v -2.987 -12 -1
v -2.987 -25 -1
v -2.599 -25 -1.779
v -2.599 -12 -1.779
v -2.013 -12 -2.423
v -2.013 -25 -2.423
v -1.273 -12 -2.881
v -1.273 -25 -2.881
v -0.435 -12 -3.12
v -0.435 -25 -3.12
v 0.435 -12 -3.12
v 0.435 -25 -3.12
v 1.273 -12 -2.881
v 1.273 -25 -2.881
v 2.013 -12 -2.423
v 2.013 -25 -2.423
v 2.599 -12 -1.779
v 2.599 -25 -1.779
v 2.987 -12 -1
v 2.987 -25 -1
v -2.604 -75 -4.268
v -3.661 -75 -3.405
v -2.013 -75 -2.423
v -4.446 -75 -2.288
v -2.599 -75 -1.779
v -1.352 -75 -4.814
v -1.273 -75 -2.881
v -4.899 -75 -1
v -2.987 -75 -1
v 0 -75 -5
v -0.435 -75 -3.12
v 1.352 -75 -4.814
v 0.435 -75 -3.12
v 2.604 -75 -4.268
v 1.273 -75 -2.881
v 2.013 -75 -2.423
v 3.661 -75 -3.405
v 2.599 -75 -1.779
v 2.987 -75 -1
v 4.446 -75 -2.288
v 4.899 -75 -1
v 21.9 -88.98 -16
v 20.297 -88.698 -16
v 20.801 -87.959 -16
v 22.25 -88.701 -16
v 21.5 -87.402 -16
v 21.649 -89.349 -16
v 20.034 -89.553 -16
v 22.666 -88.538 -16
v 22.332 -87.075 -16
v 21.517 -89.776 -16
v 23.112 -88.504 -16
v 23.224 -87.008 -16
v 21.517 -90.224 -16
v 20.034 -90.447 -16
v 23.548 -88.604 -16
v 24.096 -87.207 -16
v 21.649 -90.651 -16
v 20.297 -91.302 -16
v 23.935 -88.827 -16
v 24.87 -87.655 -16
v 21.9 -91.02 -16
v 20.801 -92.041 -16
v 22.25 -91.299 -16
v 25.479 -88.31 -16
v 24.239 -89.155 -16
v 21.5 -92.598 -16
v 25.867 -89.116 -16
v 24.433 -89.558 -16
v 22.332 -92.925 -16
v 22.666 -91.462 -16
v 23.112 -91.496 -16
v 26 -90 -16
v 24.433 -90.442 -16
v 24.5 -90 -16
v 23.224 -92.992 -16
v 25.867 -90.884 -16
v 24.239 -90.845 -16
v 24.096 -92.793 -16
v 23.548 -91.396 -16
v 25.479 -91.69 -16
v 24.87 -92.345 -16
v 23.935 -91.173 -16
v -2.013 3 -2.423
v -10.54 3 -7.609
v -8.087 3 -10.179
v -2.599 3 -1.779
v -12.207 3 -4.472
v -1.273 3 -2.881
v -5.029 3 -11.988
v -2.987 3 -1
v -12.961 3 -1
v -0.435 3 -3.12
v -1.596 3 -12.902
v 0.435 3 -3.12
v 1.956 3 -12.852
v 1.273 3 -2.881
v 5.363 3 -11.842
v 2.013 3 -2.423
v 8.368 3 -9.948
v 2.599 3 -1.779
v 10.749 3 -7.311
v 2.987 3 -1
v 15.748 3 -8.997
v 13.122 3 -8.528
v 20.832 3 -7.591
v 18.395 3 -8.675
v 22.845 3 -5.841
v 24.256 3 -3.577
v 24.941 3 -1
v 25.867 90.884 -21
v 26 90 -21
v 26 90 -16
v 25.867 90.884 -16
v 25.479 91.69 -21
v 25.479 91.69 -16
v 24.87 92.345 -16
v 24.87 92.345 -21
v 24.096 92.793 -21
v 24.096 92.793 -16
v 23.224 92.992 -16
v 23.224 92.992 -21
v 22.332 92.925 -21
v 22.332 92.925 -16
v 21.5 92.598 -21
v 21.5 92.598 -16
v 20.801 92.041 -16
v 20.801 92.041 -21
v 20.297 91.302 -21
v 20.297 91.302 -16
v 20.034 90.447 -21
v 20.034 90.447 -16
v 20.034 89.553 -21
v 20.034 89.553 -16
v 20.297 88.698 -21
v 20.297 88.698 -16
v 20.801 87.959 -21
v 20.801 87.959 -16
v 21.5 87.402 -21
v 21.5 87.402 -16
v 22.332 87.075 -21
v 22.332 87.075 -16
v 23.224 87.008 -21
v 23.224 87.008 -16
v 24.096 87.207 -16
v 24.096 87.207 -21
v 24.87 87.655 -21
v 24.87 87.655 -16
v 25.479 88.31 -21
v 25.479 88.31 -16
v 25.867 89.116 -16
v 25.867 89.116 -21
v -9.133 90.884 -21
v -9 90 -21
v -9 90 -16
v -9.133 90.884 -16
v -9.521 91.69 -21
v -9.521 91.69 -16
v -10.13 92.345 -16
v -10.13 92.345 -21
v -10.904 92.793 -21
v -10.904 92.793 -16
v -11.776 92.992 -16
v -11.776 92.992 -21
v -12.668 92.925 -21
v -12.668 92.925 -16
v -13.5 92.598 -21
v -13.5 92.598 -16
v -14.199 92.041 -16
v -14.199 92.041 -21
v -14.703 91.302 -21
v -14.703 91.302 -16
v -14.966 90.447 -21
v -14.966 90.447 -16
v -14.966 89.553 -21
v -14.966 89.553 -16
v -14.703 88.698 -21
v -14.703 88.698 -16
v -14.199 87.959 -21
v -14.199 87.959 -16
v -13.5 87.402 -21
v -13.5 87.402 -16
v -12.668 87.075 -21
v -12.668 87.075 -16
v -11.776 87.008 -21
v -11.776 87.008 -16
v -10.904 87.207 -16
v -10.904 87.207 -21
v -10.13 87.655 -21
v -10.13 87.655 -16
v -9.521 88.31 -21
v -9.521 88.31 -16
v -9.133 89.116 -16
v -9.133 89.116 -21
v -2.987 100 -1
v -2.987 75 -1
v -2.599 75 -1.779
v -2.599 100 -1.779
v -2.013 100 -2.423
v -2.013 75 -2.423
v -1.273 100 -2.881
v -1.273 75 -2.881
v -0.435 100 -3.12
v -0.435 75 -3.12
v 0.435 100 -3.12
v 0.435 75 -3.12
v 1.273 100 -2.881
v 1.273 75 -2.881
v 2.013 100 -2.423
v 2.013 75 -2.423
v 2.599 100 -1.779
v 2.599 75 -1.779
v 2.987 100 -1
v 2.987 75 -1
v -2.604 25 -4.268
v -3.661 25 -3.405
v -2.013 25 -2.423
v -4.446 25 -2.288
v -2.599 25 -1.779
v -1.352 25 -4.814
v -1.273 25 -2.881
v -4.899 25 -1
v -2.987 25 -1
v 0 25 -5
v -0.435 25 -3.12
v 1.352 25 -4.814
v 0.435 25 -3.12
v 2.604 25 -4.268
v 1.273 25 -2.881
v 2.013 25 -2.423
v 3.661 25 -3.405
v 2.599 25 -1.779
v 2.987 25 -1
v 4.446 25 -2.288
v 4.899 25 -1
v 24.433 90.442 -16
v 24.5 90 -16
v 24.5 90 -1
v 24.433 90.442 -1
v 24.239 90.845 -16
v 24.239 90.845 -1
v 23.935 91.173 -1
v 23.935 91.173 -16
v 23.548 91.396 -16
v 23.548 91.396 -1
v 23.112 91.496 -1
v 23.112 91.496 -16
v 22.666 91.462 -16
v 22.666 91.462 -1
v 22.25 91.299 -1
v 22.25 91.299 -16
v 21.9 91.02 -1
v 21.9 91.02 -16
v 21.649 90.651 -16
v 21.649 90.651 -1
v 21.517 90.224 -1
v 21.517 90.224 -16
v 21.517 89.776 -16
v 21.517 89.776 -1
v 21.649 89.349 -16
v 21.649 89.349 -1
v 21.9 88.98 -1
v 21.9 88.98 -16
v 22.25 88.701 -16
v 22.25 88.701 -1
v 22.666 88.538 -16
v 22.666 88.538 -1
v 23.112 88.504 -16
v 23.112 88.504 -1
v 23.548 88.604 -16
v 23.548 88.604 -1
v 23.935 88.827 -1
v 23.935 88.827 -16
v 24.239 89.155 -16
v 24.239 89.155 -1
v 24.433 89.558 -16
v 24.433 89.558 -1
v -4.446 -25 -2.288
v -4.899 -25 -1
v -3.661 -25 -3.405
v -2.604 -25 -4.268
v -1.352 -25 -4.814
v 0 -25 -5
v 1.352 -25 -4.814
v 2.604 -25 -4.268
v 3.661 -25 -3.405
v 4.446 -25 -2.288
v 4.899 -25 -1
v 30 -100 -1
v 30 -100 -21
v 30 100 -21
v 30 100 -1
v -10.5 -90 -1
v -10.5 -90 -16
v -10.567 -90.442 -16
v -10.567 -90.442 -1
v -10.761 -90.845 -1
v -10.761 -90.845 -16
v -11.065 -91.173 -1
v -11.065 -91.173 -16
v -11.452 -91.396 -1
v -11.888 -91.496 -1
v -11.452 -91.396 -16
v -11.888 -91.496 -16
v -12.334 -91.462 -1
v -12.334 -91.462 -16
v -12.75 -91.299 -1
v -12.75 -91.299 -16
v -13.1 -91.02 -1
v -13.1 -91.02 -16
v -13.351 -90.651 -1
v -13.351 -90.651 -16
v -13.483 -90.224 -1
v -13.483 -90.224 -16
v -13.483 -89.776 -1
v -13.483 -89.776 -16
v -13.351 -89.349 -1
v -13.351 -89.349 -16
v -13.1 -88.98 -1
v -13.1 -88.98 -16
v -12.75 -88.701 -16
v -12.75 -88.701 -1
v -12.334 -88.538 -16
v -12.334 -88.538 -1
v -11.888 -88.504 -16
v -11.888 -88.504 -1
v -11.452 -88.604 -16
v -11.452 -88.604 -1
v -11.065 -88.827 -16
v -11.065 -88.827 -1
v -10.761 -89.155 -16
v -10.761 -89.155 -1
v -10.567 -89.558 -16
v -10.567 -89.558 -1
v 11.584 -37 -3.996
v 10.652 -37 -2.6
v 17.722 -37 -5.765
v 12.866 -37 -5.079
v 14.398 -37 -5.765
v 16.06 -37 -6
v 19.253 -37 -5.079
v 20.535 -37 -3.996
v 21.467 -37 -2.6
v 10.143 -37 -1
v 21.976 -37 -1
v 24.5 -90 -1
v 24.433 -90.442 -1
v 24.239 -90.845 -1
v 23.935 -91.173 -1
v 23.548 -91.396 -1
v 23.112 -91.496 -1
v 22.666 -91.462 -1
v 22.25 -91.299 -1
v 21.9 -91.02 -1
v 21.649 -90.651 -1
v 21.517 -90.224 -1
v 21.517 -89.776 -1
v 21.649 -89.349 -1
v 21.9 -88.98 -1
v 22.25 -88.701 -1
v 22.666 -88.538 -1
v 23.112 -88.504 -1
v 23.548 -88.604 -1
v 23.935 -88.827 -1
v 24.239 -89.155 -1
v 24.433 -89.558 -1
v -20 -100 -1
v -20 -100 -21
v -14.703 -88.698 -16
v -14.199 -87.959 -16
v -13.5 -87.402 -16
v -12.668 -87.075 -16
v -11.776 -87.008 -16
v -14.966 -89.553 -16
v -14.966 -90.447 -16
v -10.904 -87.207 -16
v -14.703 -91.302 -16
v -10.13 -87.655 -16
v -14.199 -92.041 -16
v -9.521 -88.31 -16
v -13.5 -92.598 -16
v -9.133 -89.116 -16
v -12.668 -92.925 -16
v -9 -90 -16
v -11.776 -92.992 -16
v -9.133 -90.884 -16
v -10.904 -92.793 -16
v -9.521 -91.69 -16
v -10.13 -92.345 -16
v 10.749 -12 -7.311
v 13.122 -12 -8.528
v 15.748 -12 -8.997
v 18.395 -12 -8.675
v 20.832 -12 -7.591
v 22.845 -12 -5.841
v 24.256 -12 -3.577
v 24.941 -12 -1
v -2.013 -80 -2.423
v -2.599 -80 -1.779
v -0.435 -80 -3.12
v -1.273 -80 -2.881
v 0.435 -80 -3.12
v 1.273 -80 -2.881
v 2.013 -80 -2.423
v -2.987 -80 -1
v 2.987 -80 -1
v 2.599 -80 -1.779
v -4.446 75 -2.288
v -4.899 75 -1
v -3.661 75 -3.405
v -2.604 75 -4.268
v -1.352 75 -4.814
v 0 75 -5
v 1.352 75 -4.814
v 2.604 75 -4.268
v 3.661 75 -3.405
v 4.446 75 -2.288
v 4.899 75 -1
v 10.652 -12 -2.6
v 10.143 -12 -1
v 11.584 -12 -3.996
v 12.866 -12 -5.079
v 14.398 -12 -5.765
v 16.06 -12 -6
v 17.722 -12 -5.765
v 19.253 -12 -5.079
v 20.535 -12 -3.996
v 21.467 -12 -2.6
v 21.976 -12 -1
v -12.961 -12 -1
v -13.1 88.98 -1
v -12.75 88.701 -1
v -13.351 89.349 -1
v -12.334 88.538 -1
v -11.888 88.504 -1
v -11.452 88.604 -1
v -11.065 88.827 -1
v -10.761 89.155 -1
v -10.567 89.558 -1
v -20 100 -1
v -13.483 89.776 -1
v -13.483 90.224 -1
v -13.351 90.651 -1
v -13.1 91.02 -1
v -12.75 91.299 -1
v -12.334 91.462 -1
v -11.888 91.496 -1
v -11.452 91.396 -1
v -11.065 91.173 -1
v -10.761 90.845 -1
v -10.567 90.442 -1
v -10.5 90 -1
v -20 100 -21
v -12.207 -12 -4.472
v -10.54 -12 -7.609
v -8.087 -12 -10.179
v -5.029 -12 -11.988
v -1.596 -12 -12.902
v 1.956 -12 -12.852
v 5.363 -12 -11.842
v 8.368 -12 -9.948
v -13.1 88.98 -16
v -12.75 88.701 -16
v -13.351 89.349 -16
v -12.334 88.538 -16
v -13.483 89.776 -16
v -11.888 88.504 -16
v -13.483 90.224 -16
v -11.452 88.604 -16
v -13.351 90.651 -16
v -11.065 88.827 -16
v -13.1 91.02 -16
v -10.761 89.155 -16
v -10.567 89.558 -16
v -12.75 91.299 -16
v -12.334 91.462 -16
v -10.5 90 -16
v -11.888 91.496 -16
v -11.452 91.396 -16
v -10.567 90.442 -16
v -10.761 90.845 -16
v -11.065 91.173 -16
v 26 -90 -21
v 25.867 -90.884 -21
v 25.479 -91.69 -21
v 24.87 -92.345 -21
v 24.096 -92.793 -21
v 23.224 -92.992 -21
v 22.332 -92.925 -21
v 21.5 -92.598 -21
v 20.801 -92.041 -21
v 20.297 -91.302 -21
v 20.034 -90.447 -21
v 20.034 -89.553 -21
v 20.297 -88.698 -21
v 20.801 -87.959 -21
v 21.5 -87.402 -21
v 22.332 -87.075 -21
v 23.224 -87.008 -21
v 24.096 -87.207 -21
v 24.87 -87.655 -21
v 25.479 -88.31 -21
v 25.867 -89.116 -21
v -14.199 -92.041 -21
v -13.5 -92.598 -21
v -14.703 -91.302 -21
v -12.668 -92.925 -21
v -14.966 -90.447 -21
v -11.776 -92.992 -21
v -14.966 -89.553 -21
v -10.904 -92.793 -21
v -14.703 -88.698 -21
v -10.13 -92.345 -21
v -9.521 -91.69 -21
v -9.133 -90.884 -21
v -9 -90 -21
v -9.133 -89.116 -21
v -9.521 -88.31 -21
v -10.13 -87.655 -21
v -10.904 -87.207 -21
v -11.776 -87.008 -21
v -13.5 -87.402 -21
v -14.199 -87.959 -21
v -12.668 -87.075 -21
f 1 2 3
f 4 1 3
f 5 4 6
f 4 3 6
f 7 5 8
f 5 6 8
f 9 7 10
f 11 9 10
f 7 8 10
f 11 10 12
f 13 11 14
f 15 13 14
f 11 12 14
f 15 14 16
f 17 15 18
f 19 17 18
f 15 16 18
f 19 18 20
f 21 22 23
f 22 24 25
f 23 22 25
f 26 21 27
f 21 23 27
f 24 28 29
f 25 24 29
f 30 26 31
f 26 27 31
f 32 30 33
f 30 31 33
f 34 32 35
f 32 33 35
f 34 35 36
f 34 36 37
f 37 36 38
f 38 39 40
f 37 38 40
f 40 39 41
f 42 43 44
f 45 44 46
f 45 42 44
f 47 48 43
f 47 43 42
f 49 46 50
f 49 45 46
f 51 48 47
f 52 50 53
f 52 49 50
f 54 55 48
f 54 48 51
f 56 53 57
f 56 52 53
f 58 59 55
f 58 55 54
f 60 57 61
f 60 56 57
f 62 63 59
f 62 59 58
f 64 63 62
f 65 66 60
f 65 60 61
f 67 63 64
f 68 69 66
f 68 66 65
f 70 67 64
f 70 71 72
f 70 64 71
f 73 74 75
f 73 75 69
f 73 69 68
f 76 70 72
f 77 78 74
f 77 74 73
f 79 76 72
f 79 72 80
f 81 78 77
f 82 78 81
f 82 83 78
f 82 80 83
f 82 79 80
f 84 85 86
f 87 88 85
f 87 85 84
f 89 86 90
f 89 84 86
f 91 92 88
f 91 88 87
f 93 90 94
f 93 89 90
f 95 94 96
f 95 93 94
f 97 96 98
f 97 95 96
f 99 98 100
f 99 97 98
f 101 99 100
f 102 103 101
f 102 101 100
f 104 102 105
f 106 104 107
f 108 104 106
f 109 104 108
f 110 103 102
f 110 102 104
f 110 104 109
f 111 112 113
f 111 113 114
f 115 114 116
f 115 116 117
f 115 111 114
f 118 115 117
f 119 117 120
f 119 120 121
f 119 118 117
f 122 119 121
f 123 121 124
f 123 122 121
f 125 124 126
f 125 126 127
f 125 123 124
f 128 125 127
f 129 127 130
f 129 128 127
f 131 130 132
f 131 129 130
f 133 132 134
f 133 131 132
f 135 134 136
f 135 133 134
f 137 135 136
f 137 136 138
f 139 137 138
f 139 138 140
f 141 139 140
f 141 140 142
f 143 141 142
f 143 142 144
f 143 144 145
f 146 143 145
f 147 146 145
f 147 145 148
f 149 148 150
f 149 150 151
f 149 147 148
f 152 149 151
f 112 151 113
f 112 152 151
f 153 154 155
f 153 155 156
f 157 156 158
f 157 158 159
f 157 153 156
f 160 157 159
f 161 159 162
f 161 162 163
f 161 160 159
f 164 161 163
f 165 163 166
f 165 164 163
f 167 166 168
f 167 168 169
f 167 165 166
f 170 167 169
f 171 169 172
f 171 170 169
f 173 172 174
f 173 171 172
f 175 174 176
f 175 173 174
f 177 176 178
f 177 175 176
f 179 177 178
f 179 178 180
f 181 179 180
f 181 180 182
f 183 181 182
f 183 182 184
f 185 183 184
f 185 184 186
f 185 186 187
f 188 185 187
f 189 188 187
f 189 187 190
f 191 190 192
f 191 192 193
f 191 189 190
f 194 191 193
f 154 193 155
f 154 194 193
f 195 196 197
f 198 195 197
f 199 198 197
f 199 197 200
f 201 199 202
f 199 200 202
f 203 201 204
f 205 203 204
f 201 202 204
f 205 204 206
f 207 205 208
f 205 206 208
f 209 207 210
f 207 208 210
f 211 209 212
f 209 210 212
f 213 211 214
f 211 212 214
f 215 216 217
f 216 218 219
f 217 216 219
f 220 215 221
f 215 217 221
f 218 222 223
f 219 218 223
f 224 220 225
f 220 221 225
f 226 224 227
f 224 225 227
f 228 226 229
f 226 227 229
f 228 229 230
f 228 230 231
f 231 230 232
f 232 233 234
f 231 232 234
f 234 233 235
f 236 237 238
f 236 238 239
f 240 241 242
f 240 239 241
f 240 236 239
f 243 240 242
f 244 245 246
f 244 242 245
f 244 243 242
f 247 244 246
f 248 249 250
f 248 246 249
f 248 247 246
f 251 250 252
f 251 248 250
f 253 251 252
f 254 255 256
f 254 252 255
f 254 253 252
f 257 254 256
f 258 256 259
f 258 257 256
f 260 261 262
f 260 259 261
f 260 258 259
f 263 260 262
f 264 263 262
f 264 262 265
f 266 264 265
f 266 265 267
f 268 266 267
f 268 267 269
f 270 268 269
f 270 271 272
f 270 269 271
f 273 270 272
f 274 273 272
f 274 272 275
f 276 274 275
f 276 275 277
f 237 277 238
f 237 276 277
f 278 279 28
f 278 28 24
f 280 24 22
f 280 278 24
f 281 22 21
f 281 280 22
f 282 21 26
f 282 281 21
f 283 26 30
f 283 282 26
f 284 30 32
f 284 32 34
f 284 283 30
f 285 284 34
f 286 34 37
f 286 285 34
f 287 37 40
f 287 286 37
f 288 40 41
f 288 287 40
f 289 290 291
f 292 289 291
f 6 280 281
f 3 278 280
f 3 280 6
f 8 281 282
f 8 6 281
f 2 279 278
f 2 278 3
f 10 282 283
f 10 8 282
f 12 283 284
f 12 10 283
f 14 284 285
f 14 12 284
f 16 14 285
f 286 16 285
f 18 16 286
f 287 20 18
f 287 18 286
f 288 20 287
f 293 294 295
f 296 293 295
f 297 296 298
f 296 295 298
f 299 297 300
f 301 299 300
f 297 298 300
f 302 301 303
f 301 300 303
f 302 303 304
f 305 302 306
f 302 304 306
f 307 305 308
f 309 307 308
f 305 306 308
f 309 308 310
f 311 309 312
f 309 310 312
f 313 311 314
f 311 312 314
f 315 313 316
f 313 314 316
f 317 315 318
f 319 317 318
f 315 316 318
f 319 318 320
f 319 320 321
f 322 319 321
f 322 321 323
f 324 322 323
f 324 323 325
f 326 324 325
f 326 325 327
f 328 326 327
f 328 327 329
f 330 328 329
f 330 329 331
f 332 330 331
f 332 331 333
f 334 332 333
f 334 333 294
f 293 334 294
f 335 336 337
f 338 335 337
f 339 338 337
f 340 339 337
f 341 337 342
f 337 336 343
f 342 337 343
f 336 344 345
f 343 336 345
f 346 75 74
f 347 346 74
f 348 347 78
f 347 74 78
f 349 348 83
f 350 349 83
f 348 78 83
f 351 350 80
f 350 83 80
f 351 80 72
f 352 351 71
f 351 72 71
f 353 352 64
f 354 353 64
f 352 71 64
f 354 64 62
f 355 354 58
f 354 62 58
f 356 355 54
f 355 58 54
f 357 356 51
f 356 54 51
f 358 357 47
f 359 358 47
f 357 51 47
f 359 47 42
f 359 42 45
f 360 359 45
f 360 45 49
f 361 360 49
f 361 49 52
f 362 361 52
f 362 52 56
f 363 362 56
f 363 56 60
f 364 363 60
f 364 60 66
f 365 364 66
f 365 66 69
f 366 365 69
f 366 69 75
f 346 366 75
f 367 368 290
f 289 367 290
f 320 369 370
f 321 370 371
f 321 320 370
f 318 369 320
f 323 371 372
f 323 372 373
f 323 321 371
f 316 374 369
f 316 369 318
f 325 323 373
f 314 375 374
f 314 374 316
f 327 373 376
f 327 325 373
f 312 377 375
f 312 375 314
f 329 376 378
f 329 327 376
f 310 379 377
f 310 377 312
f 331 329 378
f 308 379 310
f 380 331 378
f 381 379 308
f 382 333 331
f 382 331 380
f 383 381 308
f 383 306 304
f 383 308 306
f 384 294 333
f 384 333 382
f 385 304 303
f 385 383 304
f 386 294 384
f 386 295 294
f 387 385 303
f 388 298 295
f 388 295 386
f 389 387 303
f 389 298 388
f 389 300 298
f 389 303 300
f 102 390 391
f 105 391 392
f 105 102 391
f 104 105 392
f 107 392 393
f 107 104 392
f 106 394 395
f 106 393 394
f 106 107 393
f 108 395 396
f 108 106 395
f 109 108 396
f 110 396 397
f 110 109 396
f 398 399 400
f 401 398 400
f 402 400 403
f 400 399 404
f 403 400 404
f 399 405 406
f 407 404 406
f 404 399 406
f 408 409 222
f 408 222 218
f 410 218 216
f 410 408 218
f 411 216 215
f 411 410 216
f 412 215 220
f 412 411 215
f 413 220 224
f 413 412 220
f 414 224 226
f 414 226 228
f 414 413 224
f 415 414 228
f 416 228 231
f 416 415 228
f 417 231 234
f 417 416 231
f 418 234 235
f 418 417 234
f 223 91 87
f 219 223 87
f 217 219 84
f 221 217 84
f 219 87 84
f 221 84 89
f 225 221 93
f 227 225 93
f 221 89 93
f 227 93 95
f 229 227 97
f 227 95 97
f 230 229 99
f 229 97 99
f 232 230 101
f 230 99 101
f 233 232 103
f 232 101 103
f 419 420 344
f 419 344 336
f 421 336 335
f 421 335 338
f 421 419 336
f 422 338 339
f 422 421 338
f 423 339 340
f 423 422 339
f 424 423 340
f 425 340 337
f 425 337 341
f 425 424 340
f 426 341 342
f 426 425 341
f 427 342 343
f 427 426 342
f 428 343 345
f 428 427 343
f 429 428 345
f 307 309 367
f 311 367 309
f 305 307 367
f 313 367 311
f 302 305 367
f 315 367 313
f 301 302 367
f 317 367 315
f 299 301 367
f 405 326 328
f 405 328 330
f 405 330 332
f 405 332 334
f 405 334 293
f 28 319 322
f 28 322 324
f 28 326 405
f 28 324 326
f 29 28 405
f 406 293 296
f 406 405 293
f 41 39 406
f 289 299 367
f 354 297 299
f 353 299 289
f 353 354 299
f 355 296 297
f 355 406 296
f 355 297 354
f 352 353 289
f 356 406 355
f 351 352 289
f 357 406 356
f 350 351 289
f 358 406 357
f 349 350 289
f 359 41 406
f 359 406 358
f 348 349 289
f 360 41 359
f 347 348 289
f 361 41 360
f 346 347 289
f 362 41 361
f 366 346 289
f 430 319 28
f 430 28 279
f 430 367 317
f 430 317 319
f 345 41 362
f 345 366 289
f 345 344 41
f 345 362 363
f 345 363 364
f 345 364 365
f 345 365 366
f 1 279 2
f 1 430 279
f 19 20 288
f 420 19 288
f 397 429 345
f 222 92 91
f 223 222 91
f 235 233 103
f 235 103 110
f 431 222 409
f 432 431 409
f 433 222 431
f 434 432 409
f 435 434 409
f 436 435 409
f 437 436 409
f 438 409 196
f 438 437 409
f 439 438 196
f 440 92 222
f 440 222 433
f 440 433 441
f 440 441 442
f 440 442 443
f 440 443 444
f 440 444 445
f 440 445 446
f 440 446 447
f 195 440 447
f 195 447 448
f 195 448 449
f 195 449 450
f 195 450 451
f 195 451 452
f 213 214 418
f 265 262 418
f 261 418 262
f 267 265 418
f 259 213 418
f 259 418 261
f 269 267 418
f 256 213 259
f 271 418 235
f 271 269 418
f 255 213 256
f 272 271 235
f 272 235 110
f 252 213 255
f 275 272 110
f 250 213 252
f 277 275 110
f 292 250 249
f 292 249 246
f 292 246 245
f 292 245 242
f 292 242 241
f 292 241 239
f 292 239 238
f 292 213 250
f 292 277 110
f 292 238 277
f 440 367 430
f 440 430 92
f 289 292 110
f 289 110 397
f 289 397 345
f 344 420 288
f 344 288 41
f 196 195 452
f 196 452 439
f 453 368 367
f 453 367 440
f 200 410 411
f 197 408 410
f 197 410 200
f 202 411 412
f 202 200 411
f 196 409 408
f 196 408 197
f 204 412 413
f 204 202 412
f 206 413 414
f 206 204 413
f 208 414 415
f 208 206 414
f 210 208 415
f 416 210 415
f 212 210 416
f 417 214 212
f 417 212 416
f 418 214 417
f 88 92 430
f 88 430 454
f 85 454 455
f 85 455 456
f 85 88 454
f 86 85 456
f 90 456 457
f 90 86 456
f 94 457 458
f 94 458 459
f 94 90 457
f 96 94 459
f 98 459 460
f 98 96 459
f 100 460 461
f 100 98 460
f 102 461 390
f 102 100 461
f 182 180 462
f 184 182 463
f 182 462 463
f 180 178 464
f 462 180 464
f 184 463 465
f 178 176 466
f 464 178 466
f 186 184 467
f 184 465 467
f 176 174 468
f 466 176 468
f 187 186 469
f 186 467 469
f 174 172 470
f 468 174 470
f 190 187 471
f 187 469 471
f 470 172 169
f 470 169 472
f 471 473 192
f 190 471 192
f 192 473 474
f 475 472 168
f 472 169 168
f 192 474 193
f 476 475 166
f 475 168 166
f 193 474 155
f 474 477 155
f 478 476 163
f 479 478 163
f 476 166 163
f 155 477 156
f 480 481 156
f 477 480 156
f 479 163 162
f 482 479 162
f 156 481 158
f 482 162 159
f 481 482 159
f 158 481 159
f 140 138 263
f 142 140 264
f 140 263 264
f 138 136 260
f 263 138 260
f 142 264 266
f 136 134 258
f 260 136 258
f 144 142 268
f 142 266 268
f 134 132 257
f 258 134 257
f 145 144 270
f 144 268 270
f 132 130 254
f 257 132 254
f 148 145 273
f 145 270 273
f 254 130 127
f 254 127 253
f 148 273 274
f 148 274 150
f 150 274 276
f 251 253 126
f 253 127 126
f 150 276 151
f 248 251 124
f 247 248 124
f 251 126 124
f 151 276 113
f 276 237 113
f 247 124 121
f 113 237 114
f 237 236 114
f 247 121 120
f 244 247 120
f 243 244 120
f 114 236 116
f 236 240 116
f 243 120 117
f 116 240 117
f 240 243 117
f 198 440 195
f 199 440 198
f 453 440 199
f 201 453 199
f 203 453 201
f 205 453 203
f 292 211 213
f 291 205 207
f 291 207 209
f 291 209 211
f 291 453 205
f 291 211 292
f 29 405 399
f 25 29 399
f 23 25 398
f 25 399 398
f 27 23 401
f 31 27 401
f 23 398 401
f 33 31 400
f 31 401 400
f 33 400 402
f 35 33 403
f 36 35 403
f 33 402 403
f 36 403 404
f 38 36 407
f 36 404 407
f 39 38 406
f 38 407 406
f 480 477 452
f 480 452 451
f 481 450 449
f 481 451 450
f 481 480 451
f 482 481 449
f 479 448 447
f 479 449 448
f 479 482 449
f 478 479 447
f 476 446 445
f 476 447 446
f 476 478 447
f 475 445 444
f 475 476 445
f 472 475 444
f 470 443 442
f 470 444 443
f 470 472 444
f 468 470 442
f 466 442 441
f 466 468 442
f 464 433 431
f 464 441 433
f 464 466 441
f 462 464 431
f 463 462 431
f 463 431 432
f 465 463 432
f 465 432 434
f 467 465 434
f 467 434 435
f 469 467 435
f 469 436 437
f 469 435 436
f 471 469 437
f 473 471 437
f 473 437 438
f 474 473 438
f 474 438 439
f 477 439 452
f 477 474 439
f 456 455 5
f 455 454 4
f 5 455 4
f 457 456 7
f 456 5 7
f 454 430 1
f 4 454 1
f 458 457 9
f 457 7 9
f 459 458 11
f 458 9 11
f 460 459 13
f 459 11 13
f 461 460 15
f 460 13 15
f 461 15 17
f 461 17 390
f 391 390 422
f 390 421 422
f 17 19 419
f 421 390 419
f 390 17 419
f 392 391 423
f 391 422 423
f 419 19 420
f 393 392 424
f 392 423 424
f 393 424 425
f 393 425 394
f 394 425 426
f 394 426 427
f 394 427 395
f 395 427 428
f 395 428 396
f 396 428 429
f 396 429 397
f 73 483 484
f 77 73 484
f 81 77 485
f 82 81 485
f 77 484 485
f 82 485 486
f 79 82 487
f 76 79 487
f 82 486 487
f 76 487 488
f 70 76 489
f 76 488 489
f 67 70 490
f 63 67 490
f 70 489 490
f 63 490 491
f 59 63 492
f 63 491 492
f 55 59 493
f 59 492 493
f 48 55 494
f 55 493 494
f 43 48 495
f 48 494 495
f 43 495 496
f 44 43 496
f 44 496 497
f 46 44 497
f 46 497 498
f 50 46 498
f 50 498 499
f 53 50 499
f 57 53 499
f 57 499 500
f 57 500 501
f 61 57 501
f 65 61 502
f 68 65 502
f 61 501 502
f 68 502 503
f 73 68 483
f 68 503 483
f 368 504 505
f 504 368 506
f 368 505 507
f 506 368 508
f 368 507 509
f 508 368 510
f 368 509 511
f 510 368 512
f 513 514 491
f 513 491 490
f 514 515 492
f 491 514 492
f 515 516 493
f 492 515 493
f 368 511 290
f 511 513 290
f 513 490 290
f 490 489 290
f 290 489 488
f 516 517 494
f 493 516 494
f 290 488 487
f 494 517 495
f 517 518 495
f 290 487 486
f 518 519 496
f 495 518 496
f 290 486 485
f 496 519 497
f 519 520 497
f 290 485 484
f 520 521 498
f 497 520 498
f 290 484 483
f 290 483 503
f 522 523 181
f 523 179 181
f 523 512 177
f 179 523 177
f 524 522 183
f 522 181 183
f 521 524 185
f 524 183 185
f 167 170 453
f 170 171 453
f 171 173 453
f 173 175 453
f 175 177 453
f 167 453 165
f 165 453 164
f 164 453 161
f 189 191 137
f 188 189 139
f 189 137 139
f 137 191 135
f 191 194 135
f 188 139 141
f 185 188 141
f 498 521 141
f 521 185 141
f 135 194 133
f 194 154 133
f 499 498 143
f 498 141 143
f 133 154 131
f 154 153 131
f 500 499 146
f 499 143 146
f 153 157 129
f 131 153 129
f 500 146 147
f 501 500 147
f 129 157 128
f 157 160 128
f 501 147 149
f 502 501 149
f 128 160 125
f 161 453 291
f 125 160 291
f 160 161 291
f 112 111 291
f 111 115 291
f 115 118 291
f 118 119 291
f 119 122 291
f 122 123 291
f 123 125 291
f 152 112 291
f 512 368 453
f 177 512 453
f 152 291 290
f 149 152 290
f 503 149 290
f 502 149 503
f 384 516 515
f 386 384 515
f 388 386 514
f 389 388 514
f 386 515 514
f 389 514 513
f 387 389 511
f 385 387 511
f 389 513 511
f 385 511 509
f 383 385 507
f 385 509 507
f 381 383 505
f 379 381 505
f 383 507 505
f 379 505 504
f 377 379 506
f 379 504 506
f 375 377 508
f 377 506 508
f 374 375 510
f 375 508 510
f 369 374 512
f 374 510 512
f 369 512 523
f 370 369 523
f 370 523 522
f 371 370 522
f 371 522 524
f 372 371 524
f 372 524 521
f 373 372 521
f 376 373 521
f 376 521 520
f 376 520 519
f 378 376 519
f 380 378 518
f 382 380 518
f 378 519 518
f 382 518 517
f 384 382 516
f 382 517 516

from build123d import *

# Parameters (mm, degrees)
SKETCH006_R     = 3.15
PAD002_DEPTH    = 190
SKETCH011_R     = 5
PAD007_DEPTH    = 50
SKETCH010_R     = 5
PAD006_DEPTH    = 50
SKETCH008_R     = 13
PAD004_DEPTH    = 15
SKETCH009_R     = 9
PAD005_DEPTH    = 15
SKETCH013_R     = 6
PAD008_DEPTH    = 26
BOX001_W        = 50
BOX001_H        = 200
BOX001_DEPTH    = 20
SKETCH015_R     = 1.5
POCKET001_DEPTH = 434.247304
SKETCH016_R     = 1.5
POCKET002_DEPTH = 434.247304
SKETCH017_R     = 3
POCKET003_DEPTH = 5
SKETCH018_R     = 3
POCKET004_DEPTH = 5


with BuildPart() as pad002:
    # Sketch006 → Pad002 (new body)
    with BuildSketch(Plane.XZ.offset(80)):
        Circle(SKETCH006_R)
    extrude(amount=-PAD002_DEPTH)


with BuildPart() as pad007:
    # Sketch011 → Pad007 (new body)
    with BuildSketch(Plane.XZ.offset(-75)):
        Circle(SKETCH011_R)
    extrude(amount=PAD007_DEPTH)


with BuildPart() as scassi_perno:
    # Sketch010 → Pad006 (new body)
    with BuildSketch(Plane.XZ.offset(25)):
        Circle(SKETCH010_R)
    extrude(amount=PAD006_DEPTH)

    # Fusion002: union Pad007
    add(pad007.part)


with BuildPart() as scasso_ruota_dentata:
    # Sketch008 → Pad004 (new body)
    with BuildSketch(Plane.XZ.offset(-3)):
        Circle(SKETCH008_R)
    extrude(amount=PAD004_DEPTH)


with BuildPart() as scassi_ruote_dentate:
    # Sketch009 → Pad005 (new body)
    with BuildSketch(Plane.XZ.offset(-3)):
        with Locations((15.997087, 9e-06)):
            Circle(SKETCH009_R)
    extrude(amount=PAD005_DEPTH)

    # Fusion001: union scasso_ruota_dentata
    add(scasso_ruota_dentata.part)


with BuildPart() as fusion:
    # Sketch013 → Pad008 (new body)
    with BuildSketch(Plane.XZ.offset(11)):
        with Locations((16.059561, 9e-06)):
            Circle(SKETCH013_R)
    extrude(amount=PAD008_DEPTH)

    # Fusion005: union scassi_perno, scassi_ruote_dentate
    add(scassi_perno.part)
    add(scassi_ruote_dentate.part)

    # Fusion: union Pad002
    add(pad002.part)


with BuildPart() as tappo_viti:
    # Box001 → Box001 (new body)
    with BuildSketch(Plane(origin=(-20, -100, -21), x_dir=(1, 0, 0), z_dir=(0, 0, 1))):
        with Locations((25, 100)):
            Rectangle(BOX001_W, BOX001_H)
    extrude(amount=BOX001_DEPTH)

    # Cut001: cut Fusion
    add(fusion.part, mode=Mode.SUBTRACT)

    # Sketch015 → Pocket001 (cut, through all)
    with BuildSketch(Plane(origin=(0, 0, -21), x_dir=(1, 0, 0), z_dir=(0, 0, -1))):
        with Locations((23, 90)):
            Circle(SKETCH015_R)
    pocket001 = extrude(amount=-POCKET001_DEPTH, mode=Mode.SUBTRACT)

    # Mirrored: Pocket001 across Sketch015 H_Axis
    add(pocket001.mirror(Plane(origin=(0, 0, -21), x_dir=(0, 0, -1), z_dir=(0, -1, 0))), mode=Mode.SUBTRACT)

    # Sketch016 → Pocket002 (cut, through all)
    with BuildSketch(Plane(origin=(0, 0, -21), x_dir=(1, 0, 0), z_dir=(0, 0, -1))):
        with Locations((-12, 90)):
            Circle(SKETCH016_R)
    pocket002 = extrude(amount=-POCKET002_DEPTH, mode=Mode.SUBTRACT)

    # Mirrored001: Pocket002 across Sketch016 H_Axis
    add(pocket002.mirror(Plane(origin=(0, 0, -21), x_dir=(0, 0, -1), z_dir=(0, -1, 0))), mode=Mode.SUBTRACT)

    # Sketch017 → Pocket003 (cut)
    with BuildSketch(Plane(origin=(0, 0, -21), x_dir=(1, 0, 0), z_dir=(0, 0, -1))):
        with Locations((23, 90)):
            Circle(SKETCH017_R)
    pocket003 = extrude(amount=-POCKET003_DEPTH, mode=Mode.SUBTRACT)

    # Mirrored002: Pocket003 across Sketch017 H_Axis
    add(pocket003.mirror(Plane(origin=(0, 0, -21), x_dir=(0, 0, -1), z_dir=(0, -1, 0))), mode=Mode.SUBTRACT)

    # Sketch018 → Pocket004 (cut)
    with BuildSketch(Plane(origin=(0, 0, -21), x_dir=(1, 0, 0), z_dir=(0, 0, -1))):
        with Locations((-12, 90)):
            Circle(SKETCH018_R)
    pocket004 = extrude(amount=-POCKET004_DEPTH, mode=Mode.SUBTRACT)

    # Mirrored003: Pocket004 across Sketch018 H_Axis
    add(pocket004.mirror(Plane(origin=(0, 0, -21), x_dir=(0, 0, -1), z_dir=(0, -1, 0))), mode=Mode.SUBTRACT)


solid = tappo_viti.part
